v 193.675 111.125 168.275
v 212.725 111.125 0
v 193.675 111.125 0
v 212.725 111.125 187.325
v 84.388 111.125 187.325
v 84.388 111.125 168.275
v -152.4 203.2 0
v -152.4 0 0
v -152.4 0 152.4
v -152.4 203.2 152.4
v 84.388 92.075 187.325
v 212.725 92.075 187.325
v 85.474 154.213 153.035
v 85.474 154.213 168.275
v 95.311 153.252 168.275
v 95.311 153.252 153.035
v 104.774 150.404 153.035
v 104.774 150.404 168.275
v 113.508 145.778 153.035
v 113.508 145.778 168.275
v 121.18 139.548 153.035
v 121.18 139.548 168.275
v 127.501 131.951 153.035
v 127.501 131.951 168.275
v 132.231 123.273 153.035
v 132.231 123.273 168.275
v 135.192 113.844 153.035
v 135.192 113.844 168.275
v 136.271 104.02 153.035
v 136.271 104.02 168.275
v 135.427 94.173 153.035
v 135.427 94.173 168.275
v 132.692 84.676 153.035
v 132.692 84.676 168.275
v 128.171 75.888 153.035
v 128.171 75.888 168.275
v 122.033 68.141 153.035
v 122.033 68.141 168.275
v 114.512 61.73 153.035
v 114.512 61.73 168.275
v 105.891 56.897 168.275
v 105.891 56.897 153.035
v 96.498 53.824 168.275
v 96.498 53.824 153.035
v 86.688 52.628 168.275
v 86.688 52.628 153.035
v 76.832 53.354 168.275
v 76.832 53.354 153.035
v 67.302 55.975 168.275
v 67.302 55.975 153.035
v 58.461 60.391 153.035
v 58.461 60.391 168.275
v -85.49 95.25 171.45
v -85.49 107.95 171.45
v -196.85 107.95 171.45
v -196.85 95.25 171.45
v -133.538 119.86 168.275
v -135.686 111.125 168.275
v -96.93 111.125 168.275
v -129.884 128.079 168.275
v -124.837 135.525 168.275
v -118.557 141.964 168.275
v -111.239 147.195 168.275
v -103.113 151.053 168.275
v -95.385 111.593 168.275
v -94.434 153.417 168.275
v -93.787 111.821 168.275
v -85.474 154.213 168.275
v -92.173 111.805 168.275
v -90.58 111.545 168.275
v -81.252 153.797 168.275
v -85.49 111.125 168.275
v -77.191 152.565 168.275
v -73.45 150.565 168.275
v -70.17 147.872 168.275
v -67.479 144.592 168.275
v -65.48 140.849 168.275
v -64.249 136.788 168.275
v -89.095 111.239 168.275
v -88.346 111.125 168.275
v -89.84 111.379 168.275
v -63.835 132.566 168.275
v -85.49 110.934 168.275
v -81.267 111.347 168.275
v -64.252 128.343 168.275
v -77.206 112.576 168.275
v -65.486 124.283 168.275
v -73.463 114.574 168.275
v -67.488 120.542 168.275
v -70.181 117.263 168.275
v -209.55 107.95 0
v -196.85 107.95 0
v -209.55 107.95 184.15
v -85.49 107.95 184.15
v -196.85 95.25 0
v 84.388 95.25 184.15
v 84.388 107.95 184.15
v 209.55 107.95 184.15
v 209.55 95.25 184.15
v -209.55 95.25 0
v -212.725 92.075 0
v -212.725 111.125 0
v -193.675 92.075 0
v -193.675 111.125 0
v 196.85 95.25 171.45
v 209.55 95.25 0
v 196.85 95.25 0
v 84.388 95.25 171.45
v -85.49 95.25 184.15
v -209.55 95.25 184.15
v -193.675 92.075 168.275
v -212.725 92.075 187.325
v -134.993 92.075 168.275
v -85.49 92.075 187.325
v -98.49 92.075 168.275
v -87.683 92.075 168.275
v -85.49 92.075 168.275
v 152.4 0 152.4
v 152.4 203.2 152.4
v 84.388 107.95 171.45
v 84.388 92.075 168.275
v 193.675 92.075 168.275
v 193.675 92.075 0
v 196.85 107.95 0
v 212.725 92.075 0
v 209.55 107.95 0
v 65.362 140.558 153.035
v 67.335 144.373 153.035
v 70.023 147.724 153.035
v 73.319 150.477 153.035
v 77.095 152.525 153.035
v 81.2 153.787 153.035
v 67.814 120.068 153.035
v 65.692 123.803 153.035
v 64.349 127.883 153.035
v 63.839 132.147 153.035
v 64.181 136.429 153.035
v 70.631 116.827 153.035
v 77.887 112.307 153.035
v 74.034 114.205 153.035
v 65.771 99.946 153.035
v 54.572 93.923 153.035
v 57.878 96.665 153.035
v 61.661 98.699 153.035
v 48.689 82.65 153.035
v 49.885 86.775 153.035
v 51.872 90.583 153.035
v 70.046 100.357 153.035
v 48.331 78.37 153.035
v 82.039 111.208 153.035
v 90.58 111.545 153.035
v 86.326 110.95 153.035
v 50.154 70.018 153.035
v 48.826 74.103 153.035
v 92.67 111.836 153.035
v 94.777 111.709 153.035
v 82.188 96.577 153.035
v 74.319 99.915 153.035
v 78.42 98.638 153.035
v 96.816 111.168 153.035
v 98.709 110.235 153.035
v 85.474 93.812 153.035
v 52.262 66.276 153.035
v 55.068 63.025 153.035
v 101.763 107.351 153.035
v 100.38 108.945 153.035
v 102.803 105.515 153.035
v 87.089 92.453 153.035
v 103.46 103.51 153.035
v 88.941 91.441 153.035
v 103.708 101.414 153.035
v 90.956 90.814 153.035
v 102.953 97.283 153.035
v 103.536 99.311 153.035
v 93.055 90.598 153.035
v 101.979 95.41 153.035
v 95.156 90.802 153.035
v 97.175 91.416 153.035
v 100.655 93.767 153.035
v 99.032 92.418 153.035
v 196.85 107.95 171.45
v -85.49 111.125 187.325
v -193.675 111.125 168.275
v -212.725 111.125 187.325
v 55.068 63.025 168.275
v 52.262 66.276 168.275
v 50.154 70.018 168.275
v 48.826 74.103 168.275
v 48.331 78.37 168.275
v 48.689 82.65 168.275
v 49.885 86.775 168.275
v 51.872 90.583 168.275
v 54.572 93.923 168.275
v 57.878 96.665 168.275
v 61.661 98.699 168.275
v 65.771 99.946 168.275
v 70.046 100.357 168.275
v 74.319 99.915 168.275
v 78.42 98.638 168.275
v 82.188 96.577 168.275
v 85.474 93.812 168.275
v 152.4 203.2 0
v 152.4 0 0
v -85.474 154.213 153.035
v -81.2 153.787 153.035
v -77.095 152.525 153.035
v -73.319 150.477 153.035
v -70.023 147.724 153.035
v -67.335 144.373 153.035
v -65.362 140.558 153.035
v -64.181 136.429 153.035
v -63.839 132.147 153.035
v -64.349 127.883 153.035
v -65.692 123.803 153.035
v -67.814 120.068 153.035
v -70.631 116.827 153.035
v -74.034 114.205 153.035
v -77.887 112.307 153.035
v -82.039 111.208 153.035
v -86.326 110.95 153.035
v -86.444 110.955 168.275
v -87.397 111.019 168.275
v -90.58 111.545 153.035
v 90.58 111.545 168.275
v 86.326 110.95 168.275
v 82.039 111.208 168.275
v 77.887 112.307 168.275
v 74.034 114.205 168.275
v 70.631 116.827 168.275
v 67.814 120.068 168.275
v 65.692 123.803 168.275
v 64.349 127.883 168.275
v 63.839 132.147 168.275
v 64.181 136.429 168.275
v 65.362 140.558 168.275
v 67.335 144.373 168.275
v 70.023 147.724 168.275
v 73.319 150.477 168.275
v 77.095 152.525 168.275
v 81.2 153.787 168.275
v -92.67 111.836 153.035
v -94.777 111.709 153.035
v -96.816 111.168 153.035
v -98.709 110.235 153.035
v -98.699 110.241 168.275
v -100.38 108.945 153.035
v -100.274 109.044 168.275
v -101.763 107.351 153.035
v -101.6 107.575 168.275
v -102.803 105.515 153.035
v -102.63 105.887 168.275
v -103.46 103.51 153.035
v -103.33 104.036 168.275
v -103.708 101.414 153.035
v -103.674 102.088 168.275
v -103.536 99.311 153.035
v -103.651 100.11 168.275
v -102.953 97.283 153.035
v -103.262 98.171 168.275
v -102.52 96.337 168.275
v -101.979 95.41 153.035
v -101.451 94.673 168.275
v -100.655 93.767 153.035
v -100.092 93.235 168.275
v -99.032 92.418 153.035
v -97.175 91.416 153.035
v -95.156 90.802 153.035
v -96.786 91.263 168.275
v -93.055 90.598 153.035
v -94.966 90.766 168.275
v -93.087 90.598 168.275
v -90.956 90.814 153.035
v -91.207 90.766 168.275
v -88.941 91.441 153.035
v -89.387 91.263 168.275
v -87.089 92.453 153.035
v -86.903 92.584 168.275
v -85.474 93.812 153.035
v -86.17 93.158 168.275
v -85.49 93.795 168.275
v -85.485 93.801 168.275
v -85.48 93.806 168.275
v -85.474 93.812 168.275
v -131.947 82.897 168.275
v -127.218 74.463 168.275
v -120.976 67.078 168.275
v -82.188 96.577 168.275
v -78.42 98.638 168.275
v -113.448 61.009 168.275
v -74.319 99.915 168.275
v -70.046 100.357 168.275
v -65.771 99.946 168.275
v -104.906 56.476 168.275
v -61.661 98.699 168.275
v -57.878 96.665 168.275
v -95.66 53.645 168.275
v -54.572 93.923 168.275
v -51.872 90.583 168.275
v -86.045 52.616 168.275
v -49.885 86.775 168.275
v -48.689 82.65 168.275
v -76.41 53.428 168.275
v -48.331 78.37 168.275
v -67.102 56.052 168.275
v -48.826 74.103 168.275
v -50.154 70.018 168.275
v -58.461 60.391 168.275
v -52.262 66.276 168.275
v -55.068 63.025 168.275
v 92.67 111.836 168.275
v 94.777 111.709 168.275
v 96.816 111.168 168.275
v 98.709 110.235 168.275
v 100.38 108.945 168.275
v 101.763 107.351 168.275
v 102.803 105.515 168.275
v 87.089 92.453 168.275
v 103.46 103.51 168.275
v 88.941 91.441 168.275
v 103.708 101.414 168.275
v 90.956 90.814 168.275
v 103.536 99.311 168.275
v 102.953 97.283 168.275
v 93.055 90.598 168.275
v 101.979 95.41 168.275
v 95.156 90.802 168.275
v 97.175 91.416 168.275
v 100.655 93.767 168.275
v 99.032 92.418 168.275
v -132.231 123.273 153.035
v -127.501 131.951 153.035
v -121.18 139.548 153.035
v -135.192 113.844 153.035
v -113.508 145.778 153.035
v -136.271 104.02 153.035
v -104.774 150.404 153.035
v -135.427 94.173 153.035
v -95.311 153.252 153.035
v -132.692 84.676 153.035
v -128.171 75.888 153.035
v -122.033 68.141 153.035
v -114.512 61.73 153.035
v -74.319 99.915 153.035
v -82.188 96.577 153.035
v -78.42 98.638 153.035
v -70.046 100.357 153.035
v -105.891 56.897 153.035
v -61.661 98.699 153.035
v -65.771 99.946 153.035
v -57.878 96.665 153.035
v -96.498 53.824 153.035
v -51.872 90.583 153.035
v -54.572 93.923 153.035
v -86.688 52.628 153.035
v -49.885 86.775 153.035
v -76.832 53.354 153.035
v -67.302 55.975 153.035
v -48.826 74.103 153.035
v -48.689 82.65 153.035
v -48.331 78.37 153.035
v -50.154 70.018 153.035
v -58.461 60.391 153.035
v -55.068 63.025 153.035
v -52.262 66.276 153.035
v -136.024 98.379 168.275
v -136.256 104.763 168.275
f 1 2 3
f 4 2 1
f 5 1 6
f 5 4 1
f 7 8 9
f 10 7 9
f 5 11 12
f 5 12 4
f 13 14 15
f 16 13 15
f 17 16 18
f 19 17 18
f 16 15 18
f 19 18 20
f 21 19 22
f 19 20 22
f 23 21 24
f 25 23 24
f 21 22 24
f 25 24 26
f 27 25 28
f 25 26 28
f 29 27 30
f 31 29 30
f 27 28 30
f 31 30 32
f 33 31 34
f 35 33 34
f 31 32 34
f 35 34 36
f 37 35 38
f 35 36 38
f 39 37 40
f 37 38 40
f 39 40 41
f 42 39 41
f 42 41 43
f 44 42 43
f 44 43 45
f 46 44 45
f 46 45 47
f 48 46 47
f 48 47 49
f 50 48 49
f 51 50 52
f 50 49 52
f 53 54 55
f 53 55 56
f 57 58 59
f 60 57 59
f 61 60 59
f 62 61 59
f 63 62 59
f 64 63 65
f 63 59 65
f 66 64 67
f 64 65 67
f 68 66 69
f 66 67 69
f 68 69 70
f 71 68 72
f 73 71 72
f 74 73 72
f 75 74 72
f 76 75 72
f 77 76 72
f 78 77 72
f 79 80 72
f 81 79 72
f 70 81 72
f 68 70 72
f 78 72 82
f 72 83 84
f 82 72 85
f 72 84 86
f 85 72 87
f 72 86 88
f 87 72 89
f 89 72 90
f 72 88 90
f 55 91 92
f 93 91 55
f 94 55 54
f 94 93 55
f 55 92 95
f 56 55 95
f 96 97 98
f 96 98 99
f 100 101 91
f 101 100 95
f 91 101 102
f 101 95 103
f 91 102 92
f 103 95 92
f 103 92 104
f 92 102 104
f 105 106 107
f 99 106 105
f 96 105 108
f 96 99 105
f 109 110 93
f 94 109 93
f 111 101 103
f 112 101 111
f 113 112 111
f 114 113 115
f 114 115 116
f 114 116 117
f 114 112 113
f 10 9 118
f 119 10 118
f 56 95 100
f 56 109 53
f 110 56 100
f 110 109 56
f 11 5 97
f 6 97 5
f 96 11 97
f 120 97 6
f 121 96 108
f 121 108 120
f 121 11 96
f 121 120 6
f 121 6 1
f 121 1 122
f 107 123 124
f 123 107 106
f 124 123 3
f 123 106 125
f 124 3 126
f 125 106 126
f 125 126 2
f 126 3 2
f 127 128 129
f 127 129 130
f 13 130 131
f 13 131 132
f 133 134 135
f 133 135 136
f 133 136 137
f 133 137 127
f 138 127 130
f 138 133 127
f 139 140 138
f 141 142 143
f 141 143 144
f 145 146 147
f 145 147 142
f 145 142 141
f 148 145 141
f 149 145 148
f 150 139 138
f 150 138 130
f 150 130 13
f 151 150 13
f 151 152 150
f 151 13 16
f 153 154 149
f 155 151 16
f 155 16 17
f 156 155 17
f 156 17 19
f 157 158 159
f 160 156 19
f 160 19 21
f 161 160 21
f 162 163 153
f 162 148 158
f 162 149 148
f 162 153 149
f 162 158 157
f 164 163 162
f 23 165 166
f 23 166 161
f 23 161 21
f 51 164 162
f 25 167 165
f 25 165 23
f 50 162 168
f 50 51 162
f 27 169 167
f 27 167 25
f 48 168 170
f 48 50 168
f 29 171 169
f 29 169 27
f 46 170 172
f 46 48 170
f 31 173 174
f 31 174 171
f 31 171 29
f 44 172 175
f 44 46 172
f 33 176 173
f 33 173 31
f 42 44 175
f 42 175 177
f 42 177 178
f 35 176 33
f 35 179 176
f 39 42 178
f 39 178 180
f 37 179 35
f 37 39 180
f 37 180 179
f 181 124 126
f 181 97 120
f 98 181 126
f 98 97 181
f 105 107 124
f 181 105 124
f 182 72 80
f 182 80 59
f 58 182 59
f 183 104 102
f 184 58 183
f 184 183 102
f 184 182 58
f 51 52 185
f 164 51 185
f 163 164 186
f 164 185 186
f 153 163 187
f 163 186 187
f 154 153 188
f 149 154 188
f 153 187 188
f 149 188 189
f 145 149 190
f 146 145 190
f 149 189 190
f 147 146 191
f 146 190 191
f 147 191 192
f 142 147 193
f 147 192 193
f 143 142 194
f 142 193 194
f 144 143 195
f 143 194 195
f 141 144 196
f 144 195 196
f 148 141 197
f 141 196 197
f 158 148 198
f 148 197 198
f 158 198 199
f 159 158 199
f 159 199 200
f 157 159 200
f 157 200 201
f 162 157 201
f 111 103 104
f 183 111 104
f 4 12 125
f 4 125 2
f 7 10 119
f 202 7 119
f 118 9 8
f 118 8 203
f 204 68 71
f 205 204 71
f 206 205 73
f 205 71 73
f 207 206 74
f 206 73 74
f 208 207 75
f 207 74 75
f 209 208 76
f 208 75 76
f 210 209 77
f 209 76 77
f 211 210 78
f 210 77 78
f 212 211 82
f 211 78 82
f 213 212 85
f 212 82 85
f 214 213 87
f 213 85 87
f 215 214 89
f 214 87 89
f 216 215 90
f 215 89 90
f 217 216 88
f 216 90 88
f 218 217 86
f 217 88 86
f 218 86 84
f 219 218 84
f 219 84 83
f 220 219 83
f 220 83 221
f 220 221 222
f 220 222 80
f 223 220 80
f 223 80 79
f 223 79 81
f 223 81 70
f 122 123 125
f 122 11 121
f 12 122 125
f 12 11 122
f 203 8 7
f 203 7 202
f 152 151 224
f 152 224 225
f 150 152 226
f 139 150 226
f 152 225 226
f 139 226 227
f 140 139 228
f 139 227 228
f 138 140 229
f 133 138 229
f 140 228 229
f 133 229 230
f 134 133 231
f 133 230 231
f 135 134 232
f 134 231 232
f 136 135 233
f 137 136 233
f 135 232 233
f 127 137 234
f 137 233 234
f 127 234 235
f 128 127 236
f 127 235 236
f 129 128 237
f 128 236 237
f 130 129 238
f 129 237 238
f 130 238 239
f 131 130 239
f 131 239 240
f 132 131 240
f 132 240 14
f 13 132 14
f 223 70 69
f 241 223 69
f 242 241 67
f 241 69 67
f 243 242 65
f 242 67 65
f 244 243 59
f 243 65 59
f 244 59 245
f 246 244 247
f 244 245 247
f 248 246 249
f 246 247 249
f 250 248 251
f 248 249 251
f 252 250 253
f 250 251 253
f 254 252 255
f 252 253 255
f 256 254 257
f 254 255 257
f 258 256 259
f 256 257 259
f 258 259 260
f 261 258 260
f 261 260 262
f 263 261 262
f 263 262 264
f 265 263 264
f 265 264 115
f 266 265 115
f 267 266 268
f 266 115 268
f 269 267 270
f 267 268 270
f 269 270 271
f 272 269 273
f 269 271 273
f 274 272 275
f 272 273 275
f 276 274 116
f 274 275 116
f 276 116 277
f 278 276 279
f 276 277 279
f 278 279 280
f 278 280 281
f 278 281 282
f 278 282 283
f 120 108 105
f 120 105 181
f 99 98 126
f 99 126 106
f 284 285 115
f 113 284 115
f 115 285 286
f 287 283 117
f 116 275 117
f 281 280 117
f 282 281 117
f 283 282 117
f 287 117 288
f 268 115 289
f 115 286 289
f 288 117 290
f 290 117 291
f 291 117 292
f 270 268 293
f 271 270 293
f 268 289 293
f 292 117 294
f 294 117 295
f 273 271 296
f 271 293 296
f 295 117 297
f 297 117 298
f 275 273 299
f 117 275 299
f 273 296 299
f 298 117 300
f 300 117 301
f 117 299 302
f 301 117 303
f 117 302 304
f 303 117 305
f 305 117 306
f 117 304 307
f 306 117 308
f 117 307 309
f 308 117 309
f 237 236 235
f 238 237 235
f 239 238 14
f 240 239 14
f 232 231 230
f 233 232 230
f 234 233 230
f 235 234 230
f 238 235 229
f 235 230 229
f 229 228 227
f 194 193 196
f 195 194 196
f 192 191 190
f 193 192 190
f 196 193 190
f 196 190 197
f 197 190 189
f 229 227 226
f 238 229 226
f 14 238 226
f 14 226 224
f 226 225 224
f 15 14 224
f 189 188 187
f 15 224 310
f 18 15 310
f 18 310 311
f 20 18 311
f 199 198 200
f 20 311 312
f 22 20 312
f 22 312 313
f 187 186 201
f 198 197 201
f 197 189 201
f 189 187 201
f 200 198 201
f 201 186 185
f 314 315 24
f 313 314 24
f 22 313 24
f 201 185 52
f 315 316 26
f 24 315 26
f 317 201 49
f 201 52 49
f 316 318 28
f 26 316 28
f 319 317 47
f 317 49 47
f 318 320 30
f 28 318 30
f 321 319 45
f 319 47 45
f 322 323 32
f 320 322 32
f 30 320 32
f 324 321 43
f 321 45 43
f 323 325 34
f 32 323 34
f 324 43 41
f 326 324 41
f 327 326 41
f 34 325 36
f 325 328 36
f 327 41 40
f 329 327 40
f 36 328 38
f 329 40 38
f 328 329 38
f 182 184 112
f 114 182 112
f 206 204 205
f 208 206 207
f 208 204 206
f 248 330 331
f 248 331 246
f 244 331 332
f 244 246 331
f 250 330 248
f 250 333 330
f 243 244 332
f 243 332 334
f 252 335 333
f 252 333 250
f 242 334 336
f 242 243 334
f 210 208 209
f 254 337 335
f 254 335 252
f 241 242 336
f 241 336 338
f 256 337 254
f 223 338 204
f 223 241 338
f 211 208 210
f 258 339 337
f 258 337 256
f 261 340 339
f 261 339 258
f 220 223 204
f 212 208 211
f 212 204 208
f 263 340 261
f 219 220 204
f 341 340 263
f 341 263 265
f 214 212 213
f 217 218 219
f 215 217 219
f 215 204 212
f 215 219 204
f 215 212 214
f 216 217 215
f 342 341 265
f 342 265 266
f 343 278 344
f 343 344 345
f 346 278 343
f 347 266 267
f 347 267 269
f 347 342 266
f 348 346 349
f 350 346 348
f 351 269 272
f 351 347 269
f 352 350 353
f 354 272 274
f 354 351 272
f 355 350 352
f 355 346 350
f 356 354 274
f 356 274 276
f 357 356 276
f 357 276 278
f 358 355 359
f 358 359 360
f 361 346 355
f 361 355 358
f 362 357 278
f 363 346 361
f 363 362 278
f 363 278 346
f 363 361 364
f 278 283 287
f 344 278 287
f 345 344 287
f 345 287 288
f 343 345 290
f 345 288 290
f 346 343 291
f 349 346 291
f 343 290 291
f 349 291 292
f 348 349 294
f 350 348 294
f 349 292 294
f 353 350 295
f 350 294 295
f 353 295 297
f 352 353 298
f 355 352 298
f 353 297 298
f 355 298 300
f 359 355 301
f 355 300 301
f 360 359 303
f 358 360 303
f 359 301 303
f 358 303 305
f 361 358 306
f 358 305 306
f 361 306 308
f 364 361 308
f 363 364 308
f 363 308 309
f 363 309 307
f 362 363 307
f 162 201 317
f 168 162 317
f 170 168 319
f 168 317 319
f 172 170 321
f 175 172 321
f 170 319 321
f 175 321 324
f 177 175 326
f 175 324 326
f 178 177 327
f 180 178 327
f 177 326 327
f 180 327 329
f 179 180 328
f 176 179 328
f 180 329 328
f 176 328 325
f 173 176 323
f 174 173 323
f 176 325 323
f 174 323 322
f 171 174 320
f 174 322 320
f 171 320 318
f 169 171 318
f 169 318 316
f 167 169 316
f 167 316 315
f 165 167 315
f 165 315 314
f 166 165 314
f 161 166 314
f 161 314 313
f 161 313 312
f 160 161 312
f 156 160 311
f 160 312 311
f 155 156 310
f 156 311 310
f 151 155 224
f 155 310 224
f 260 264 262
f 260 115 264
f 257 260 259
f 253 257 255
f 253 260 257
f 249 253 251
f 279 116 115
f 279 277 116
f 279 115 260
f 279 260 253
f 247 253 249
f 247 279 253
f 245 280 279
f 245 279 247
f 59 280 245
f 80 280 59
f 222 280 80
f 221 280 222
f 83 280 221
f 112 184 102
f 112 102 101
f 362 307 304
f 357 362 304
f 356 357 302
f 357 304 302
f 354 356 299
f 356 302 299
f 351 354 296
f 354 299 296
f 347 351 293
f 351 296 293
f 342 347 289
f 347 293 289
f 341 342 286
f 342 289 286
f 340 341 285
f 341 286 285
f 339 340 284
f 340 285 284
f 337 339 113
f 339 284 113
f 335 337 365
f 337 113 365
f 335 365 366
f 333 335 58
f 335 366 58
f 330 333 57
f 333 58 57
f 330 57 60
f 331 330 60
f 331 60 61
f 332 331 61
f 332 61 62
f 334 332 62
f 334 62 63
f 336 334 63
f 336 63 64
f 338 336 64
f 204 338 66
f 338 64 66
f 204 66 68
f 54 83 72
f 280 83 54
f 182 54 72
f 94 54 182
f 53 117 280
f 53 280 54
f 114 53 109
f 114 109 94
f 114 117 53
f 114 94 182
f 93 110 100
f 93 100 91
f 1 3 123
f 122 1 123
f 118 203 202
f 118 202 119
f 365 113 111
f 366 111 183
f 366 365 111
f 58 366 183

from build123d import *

# Parameters (mm, degrees)
F0_W     = 304.8
F0_H     = 152.4
F1_DEPTH = 203.2
F4_W     = 19.05
F4_H     = 19.05
F4_W_2   = 12.7
F4_H_2   = 12.7
F8_DEPTH = 15.24


with BuildPart() as f1:
    # F0 (on Front) → F1 (new body)
    with BuildSketch(Plane.XZ):
        with Locations((0, 76.2)):
            Rectangle(F0_W, F0_H)
    extrude(amount=-F1_DEPTH)


with BuildPart() as f5:
    # F5: sweep along a path in F3
    with BuildLine(Plane.XZ.offset(-101.6)) as f5_path:
        Line((203.2, 0), (203.2, 177.8))
        Line((203.2, 177.8), (84.3880101994, 177.8))
    # F4 (on Top) → F5 (sweep)
    with BuildSketch(Plane.XY):
        with Locations((203.2, 101.6)):
            Rectangle(F4_W, F4_H)
        with Locations((203.2, 101.6)):
            Rectangle(F4_W_2, F4_H_2, mode=Mode.SUBTRACT)
    sweep(path=f5_path.line, transition=Transition.RIGHT)


with BuildPart() as f6:
    # F6: sweep along a path in F3
    with BuildLine(Plane.XZ.offset(-101.6)) as f6_path:
        Line((-203.2, 0), (-203.2, 177.8))
        Line((-203.2, 177.8), (-85.4900650759, 177.8))
    # F4 (on Top) → F6 (sweep)
    with BuildSketch(Plane.XY):
        with Locations((-203.2, 101.6)):
            Rectangle(F4_W, F4_H)
        with Locations((-203.2, 101.6)):
            Rectangle(F4_W_2, F4_H_2, mode=Mode.SUBTRACT)
    sweep(path=f6_path.line, transition=Transition.RIGHT)

    # F7 (on face) → F8 (join)
    with BuildSketch(Plane(origin=(0, 0, 168.275), x_dir=(1, 0, 0), z_dir=(0, 0, -1))):
        with BuildLine():
            ThreePointArc((-58.4609373129, -60.3908278193), (-134.2912011879, -89.357700658), (-85.4743421078, -154.2131006718))
            ThreePointArc((-85.4743421078, -154.2131006718), (-63.9879107494, -130.0023087379), (-90.5800762449, -111.5446297711))
            ThreePointArc((-90.5800762449, -111.5446297711), (-103.2949896459, -98.2821615992), (-85.4743421078, -93.8115233757))
            ThreePointArc((-85.4743421078, -93.8115233757), (-53.1385123205, -92.3204531035), (-58.4609373129, -60.3908278193))
        make_face()
    extrude(amount=F8_DEPTH)


with BuildPart() as f8:
    # F7 (on face) → F8, piece 2 (new body)
    with BuildSketch(Plane(origin=(0, 0, 168.275), x_dir=(1, 0, 0), z_dir=(0, 0, -1))):
        with BuildLine():
            ThreePointArc((58.4609373129, -60.3908278193), (53.1385123205, -92.3204531035), (85.4743421078, -93.8115233757))
            ThreePointArc((85.4743421078, -93.8115233757), (103.2949896459, -98.2821615992), (90.5800762449, -111.5446297711))
            ThreePointArc((90.5800762449, -111.5446297711), (63.9879107494, -130.0023087379), (85.4743421078, -154.2131006718))
            ThreePointArc((85.4743421078, -154.2131006718), (134.2912011879, -89.357700658), (58.4609373129, -60.3908278193))
        make_face()
    extrude(amount=F8_DEPTH)


solid = Compound([f1.part, f5.part, f6.part, f8.part])
